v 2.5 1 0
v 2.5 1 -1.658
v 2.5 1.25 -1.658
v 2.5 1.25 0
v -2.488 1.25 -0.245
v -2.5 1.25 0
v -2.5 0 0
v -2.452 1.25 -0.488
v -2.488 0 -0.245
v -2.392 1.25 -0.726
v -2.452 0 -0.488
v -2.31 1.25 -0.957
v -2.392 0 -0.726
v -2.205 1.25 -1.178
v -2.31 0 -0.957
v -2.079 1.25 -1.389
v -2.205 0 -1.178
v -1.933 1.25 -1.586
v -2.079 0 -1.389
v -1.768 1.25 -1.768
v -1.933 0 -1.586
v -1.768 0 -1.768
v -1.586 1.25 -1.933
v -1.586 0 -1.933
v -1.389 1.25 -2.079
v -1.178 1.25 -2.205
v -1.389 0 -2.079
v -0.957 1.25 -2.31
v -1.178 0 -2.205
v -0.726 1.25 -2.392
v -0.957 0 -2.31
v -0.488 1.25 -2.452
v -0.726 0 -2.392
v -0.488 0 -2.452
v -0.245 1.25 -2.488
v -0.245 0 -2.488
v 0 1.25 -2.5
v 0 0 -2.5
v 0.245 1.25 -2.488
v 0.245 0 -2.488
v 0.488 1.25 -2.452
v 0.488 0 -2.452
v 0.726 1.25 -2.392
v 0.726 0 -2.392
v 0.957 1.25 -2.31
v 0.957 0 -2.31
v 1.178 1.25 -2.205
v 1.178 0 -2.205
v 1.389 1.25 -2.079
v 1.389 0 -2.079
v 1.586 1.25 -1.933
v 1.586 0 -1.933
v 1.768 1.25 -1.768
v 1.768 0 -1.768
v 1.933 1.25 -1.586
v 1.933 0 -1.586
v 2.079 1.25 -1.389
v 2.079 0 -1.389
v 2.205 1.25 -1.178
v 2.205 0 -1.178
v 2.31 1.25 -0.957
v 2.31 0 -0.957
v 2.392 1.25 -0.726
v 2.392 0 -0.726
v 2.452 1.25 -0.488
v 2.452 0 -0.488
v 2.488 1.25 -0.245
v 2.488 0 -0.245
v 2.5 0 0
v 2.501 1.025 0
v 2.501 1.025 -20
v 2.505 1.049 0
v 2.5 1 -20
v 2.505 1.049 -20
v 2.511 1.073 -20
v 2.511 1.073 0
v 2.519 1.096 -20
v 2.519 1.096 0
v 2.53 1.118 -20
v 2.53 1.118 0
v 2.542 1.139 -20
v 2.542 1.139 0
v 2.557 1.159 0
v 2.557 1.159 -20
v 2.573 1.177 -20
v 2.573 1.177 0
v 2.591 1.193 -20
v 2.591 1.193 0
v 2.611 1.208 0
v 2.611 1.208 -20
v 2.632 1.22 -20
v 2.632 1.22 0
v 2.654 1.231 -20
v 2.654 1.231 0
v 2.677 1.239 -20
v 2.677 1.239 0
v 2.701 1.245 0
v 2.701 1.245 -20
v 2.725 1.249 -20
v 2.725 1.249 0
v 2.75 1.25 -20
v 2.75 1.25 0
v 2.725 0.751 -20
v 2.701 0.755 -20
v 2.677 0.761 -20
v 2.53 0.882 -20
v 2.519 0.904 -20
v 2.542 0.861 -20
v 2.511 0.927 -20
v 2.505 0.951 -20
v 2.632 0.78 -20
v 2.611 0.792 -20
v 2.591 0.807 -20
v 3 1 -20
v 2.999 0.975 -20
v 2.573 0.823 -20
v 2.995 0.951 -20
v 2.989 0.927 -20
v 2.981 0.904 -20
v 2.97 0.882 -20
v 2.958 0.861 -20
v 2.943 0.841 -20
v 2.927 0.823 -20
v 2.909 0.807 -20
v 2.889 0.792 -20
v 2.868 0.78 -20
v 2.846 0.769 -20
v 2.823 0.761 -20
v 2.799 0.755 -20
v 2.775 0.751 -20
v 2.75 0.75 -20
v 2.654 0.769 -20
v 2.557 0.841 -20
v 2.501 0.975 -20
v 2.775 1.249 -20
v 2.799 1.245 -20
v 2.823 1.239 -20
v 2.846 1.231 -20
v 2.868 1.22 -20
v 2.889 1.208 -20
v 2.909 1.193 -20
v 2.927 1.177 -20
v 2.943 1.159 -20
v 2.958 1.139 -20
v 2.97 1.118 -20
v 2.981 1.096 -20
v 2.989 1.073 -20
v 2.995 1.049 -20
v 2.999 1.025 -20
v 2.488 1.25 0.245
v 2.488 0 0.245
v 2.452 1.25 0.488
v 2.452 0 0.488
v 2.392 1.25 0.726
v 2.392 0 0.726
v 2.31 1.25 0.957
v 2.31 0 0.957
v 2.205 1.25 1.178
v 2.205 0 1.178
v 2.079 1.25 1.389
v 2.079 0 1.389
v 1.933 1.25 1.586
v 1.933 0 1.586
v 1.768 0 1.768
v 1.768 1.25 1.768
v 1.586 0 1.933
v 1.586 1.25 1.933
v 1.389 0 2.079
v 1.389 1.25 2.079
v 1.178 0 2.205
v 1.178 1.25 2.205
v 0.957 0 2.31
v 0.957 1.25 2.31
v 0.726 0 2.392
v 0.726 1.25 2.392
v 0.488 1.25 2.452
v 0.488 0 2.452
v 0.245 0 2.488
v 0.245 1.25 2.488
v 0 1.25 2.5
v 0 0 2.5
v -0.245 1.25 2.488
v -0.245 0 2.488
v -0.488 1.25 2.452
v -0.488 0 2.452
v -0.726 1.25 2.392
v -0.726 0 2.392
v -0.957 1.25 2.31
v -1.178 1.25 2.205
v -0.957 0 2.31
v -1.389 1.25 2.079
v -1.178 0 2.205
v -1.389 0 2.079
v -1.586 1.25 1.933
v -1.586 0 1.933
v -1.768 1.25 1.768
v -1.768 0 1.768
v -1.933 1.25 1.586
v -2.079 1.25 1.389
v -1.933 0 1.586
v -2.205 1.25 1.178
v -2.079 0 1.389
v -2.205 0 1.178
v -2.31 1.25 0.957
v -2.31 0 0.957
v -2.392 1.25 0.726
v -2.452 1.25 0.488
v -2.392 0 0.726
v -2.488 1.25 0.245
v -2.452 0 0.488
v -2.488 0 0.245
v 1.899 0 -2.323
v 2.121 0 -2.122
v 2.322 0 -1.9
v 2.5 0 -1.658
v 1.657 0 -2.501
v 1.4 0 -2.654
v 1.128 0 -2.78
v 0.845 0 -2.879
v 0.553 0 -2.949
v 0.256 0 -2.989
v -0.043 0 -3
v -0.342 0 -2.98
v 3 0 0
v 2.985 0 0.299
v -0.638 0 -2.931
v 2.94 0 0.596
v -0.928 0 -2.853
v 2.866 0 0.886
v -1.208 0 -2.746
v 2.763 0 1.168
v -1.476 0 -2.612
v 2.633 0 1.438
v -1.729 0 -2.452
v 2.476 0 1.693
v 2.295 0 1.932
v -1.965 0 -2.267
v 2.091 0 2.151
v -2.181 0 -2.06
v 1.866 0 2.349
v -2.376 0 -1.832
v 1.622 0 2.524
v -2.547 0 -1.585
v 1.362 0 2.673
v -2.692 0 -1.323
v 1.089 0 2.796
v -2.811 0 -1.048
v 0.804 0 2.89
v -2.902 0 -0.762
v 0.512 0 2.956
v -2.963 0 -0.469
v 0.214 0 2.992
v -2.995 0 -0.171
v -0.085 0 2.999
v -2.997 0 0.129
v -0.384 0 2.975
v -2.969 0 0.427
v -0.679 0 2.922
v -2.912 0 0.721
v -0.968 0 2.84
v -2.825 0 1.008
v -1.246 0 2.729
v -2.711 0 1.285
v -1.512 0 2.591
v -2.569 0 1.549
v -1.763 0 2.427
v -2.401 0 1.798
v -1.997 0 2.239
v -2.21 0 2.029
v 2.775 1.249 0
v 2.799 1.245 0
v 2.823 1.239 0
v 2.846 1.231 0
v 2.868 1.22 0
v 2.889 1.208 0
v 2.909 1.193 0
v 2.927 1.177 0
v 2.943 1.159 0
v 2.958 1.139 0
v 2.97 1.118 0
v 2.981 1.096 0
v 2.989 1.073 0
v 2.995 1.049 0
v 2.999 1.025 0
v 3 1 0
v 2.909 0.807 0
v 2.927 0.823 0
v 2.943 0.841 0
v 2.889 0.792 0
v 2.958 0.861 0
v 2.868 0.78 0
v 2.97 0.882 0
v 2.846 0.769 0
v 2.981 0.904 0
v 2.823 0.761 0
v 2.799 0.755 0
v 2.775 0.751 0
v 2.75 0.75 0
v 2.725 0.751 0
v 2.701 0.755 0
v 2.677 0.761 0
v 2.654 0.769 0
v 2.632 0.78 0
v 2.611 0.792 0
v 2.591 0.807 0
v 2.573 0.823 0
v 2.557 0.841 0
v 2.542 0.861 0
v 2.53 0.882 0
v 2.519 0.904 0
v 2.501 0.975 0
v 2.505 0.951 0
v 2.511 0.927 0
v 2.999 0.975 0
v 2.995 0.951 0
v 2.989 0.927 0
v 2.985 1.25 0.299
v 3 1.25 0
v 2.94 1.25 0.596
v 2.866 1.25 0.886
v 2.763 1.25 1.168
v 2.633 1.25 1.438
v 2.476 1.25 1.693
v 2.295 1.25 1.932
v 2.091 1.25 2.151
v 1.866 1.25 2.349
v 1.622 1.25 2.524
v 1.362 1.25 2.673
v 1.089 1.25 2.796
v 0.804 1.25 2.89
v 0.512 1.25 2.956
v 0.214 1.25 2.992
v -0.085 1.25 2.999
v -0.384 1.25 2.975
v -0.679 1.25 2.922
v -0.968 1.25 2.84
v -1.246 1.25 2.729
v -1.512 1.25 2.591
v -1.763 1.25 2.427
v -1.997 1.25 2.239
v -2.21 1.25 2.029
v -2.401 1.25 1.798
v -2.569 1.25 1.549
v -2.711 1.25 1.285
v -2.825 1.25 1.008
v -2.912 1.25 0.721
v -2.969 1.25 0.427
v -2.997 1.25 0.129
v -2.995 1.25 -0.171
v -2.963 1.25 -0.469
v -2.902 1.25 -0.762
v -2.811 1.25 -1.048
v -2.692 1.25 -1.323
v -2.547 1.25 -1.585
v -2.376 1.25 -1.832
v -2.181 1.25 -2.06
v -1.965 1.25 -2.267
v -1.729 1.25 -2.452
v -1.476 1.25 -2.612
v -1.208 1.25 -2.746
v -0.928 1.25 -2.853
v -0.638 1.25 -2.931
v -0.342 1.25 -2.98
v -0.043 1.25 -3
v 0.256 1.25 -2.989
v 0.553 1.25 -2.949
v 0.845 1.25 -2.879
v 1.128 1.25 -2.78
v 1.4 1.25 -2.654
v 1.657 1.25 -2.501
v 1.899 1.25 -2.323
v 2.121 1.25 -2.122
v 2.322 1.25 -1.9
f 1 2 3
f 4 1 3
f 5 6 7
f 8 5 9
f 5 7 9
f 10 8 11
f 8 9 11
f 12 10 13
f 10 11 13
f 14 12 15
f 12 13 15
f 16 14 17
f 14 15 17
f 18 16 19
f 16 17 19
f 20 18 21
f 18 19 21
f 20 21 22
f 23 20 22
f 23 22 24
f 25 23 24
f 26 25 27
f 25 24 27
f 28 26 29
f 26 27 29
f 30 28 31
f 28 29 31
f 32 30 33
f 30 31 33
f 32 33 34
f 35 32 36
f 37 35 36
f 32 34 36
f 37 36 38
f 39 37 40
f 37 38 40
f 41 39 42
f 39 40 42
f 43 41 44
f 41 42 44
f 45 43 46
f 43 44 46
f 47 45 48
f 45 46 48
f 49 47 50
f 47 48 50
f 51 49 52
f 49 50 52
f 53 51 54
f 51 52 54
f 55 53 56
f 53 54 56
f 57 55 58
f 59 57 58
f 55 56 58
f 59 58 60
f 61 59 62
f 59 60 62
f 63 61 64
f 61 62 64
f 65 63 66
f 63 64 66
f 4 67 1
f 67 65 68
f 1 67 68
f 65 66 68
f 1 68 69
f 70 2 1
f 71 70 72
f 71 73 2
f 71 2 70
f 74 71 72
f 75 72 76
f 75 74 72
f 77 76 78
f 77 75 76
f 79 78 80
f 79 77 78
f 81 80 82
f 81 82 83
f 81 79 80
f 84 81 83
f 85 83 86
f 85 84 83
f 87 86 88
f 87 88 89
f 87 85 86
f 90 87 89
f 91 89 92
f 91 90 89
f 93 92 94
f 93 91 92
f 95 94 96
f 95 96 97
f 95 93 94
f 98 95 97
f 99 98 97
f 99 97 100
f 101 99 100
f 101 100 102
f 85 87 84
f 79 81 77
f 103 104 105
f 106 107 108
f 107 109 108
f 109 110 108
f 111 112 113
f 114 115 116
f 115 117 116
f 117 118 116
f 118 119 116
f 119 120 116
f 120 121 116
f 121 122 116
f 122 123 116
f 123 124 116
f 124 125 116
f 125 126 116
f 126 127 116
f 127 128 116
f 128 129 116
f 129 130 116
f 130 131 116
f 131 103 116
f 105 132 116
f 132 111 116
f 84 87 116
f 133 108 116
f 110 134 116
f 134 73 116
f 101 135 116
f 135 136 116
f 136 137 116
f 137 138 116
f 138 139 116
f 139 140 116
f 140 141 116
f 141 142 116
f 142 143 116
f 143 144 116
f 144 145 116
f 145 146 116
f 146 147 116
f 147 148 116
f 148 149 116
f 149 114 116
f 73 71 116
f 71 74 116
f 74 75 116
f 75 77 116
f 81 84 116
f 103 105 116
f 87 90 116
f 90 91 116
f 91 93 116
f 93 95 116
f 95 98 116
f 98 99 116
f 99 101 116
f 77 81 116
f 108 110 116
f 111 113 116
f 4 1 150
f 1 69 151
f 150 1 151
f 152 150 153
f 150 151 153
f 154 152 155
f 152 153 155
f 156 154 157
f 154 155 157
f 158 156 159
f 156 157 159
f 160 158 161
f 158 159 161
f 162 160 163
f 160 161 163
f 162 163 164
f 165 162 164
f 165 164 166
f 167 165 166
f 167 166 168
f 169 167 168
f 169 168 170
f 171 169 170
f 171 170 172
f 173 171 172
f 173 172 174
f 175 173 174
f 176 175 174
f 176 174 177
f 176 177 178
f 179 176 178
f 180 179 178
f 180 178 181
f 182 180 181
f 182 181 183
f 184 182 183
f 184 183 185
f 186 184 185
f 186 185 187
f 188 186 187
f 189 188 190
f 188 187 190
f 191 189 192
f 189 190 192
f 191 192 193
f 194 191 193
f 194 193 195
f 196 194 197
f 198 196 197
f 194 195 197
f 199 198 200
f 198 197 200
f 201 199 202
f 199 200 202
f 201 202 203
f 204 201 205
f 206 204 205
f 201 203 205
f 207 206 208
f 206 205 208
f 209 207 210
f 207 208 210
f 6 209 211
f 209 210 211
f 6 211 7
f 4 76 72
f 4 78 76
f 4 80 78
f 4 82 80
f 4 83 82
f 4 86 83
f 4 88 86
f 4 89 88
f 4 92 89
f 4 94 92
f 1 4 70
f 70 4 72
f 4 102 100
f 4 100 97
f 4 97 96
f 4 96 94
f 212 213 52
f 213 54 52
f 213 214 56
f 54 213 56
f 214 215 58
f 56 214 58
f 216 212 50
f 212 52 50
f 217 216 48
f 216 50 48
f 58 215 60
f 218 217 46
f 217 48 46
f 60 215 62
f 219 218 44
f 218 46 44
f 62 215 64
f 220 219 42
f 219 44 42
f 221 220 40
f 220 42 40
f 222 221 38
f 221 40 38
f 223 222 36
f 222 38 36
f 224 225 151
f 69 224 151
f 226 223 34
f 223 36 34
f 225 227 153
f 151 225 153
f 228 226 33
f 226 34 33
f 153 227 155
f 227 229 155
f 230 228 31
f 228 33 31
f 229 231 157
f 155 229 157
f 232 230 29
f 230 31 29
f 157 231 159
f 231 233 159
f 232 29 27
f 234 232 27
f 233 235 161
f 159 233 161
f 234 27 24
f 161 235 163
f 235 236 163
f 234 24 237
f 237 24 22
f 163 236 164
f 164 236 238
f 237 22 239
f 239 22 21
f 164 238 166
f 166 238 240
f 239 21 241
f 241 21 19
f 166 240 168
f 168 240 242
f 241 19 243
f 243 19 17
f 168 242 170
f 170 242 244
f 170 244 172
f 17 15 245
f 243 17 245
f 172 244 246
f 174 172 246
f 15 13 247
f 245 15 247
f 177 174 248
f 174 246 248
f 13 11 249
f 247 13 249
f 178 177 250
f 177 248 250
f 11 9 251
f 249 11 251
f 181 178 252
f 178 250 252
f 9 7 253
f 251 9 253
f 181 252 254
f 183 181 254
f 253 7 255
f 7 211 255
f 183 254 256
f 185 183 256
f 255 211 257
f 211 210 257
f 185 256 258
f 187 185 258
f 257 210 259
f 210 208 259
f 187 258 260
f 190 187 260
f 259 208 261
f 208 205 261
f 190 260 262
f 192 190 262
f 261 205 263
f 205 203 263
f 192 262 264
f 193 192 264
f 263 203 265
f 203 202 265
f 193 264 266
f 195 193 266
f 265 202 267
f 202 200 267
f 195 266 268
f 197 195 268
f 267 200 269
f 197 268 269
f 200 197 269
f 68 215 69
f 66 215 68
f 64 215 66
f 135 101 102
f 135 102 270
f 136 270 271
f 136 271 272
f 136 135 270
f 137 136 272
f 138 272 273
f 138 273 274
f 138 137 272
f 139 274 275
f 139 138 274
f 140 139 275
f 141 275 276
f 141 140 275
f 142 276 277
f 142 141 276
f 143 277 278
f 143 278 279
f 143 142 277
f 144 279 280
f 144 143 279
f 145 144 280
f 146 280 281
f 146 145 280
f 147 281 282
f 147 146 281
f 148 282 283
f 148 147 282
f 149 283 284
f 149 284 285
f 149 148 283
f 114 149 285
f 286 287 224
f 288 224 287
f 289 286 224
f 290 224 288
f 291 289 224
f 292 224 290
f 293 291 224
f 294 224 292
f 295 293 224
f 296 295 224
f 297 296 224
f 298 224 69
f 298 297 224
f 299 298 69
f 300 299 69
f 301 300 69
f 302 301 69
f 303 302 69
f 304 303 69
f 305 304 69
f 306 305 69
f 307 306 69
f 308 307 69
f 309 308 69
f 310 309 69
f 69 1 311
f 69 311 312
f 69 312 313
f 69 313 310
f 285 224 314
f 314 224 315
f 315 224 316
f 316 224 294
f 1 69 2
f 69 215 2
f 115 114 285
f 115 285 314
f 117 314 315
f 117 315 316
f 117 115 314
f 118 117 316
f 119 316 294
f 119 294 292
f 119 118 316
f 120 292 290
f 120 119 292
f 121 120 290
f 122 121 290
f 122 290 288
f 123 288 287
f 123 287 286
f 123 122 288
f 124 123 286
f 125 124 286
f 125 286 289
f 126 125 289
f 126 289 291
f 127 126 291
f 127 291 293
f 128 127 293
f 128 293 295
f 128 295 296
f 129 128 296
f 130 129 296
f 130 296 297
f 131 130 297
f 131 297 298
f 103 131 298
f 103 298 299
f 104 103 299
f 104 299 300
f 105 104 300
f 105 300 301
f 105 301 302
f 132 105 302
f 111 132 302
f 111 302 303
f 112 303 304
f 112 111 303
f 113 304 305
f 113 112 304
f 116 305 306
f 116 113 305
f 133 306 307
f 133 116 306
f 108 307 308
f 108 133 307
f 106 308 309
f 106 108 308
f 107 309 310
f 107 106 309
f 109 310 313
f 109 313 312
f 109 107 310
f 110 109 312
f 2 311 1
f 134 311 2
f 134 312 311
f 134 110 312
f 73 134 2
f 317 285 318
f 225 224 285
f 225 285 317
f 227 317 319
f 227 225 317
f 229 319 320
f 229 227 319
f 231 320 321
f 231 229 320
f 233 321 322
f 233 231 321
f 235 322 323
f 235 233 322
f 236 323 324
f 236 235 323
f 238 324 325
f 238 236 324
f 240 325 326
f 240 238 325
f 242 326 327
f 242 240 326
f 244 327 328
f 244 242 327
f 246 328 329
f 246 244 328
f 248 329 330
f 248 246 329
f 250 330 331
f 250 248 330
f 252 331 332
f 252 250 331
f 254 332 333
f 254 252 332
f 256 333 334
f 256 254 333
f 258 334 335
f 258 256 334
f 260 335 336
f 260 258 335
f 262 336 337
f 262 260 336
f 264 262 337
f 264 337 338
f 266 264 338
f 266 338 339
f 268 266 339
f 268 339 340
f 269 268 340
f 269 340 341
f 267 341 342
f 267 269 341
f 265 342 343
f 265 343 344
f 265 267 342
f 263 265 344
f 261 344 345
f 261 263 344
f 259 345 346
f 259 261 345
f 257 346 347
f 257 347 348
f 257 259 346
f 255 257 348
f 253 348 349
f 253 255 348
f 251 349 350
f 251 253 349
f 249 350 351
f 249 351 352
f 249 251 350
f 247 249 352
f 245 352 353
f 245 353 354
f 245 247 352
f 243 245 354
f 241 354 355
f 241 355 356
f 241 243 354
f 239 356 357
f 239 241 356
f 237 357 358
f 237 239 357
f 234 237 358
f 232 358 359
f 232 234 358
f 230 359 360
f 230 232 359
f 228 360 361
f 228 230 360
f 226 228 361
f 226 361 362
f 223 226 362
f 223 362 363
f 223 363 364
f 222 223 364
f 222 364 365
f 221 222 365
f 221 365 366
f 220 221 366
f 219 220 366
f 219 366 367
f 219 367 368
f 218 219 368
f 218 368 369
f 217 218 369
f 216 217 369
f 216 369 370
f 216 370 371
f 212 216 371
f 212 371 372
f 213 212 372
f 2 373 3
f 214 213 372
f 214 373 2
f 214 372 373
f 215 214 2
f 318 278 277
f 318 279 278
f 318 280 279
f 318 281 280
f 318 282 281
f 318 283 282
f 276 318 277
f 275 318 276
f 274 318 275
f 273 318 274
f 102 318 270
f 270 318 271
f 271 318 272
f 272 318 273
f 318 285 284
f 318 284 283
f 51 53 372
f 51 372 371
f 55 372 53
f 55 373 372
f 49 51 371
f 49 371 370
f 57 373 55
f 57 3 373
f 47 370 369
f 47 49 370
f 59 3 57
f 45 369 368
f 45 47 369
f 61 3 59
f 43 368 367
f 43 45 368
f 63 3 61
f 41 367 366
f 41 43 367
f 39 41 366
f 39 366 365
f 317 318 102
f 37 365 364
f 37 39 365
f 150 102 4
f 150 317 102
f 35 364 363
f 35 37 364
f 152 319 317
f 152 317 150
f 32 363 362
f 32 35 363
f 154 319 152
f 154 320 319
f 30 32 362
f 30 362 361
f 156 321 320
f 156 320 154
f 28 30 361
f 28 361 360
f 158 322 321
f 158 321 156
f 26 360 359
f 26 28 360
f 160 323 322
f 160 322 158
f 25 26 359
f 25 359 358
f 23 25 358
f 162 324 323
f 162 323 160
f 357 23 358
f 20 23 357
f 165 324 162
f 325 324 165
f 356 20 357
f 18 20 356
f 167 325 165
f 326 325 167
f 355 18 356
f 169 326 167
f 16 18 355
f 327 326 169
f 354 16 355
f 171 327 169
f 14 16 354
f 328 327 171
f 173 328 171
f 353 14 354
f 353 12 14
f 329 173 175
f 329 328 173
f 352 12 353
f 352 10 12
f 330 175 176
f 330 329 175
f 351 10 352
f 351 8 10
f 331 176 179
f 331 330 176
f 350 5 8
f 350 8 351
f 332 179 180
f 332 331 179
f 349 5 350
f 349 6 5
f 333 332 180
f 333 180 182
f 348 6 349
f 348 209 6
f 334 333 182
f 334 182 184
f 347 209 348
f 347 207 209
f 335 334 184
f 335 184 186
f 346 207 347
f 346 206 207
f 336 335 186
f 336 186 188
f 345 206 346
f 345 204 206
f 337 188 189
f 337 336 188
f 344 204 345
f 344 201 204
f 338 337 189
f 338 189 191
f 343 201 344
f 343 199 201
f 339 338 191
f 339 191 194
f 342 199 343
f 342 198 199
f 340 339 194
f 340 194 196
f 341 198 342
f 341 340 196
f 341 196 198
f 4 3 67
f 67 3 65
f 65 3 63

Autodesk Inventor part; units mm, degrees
ref_plane "YZ Plane" through (0, 0, 0) normal (1, 0, 0) x (0, 1, 0)
ref_plane "XZ Plane" through (0, 0, 0) normal (0, 1, 0) x (-1, 0, 0)
ref_plane "XY Plane" through (0, 0, 0) normal (0, 0, 1) x (1, 0, 0)
sketch "スケッチ1" plane through (0, 0, 0) normal (0, 1, 0) x (-1, 0, 0)
  circle A0 centre (0, 0) radius 2.5
  circle A1 centre (0, 0) radius 3
  line L0 (-2.5, 0) -> (-3, 0)
  line L1 (-3, 0) -> (-3, -20)
  line L2 (-3, -20) -> (-2.5, -20)
  line L3 (-2.5, -20) -> (-2.5, 0)
  point P0 (-2.5, -1.6583)
  dimension "d0" = 5
  dimension "d1" = 6
  dimension "d2" = 20
extrude "押し出し1" add sketch "スケッチ1" along normal blind 1.25
sketch "スケッチ2" plane through (3, 0, -20) normal (0, 0, -1) x (-1, 0, 0)
  line L0 (0, 0) -> (0.5, 0) projected
  line L1 (0.5, 0) -> (0.5, 1.25) projected
  line L2 (0, 1.25) -> (0.5, 1.25) projected
  line L3 (0, 0) -> (0, 1.25) projected
  circle A0 centre (0.25, 1) radius 0.25
  line L4 (0, 1.25) -> (0.5, 1.25) projected
  line L5 (0.5, 0) -> (0.5, 1.25) projected
  point P0 (3, 0)
  point P1 (0, 1)
  point P2 (0.25, 1.25)
  point P3 (0.5, 1)
extrude "押し出し2" cut sketch "スケッチ2" against normal blind 20 contours L3 A0 L1 L0 | L3 L2 A0 | A0 L2 L1
properties part number "spring_180(131)" material "アルミニウム 6061"
